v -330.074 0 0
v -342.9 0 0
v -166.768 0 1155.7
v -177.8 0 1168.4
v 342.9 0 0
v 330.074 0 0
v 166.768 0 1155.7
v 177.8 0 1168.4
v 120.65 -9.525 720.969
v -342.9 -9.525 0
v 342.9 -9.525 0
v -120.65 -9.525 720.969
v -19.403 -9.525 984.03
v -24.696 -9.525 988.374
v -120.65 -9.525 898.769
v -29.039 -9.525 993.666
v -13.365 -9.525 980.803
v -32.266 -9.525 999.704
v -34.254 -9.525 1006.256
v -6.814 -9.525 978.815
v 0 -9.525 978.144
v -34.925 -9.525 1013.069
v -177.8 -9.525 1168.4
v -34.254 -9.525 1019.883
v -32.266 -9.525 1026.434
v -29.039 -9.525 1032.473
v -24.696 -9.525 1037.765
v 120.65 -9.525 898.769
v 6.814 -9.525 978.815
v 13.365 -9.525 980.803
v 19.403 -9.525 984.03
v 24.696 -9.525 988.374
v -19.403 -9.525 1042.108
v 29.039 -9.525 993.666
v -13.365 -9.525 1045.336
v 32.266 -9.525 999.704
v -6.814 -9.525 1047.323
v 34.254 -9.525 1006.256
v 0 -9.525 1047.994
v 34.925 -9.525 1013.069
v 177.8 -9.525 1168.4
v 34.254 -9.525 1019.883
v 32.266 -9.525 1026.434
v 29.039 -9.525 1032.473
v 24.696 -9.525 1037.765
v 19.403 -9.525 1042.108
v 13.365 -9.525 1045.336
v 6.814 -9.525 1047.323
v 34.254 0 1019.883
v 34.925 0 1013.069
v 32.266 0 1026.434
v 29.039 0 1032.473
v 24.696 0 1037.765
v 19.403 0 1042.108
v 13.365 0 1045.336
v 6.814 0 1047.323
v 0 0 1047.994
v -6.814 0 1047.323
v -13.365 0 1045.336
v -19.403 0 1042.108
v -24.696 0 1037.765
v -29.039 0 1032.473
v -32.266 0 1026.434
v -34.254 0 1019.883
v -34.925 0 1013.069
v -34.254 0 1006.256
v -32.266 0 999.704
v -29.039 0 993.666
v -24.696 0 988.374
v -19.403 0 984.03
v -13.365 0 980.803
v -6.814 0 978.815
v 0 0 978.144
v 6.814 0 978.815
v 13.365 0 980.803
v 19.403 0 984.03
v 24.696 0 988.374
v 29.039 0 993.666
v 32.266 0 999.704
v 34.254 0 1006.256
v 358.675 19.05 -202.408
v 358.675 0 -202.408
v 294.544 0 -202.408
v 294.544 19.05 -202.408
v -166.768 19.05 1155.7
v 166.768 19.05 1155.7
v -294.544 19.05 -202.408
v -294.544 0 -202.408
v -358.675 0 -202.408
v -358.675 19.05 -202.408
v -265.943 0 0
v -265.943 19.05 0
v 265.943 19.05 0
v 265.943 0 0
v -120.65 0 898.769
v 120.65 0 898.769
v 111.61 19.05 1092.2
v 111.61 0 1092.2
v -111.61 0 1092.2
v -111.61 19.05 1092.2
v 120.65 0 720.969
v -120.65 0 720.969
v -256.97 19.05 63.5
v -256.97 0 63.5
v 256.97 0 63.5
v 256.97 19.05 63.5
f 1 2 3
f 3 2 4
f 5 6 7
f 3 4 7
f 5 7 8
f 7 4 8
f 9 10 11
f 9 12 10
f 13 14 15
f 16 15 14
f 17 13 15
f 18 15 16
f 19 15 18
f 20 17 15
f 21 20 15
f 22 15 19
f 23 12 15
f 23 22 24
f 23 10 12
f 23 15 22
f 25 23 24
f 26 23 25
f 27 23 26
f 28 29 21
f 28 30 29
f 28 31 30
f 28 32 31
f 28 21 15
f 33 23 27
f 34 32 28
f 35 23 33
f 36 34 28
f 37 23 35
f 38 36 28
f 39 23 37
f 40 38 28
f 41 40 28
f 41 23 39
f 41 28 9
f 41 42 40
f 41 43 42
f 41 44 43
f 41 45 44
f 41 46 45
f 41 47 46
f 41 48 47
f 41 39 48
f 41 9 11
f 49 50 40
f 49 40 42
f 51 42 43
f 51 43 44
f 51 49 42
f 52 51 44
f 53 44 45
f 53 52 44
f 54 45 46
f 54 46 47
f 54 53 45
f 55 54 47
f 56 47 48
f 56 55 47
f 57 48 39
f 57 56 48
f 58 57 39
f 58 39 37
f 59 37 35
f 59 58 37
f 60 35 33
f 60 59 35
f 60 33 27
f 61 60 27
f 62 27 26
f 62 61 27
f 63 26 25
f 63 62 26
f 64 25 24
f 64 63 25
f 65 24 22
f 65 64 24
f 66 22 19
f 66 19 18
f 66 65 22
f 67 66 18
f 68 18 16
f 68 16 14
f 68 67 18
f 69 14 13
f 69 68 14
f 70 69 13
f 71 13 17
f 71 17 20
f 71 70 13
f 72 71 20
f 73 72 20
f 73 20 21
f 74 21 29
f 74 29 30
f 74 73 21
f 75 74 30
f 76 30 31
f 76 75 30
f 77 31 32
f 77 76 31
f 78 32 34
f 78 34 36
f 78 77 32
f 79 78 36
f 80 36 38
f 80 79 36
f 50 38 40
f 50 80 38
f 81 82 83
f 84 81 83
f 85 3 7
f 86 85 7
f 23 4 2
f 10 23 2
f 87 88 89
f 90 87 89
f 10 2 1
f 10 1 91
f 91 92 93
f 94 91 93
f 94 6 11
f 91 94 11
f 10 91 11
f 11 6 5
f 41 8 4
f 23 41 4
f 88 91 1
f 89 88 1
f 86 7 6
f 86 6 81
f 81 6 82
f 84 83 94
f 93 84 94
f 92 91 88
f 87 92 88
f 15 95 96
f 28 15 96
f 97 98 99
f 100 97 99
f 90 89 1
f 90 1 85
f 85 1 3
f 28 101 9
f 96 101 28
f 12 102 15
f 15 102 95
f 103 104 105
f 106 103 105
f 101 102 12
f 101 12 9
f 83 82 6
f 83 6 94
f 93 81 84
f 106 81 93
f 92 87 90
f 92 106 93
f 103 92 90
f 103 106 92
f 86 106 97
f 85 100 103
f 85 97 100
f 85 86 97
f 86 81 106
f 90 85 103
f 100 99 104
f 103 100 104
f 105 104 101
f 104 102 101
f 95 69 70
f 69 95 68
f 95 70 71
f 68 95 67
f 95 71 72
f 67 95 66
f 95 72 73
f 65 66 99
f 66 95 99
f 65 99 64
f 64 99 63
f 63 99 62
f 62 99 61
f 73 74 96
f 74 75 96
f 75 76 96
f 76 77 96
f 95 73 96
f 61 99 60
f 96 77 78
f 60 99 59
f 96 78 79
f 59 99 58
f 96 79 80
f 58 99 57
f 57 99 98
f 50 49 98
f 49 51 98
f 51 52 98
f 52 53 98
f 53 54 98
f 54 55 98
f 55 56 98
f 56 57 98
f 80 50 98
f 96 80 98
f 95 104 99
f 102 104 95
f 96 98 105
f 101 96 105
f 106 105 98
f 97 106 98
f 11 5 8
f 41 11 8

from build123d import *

# Parameters (mm, degrees)
F0_W     = 241.3
F0_H     = 177.8
F0_R     = 34.925
F1_DEPTH = 9.525
F3_DEPTH = 19.05


with BuildPart() as f1:
    # F0 (on Front) → F1 (new body)
    with BuildSketch(Plane.XZ):
        Polygon((-177.8, 1168.4), (-342.9, 0), (342.9, 0), (177.8, 1168.4), align=None)
        with Locations((0, 809.869231)):
            Rectangle(F0_W, F0_H, mode=Mode.SUBTRACT)
        with Locations((0, 1013.069231)):
            Circle(F0_R, mode=Mode.SUBTRACT)
    extrude(amount=F1_DEPTH)

    # F2 (on face) → F3 (join)
    with BuildSketch(Plane(origin=(0, 0, 0), x_dir=(-1, 0, 0), z_dir=(0, 1, 0))):
        Polygon((-166.768402, 1155.7), (-358.675023, -202.408394), (-294.544206, -202.408394), (-265.94302, 0), (265.94302, 0), (294.544206, -202.408394), (358.675023, -202.408394), (166.768402, 1155.7), (111.610412, 1092.2), (256.970194, 63.5), (-256.970194, 63.5), (-111.610412, 1092.2), align=None)
        Polygon((166.768402, 1155.7), (-166.768402, 1155.7), (-111.610412, 1092.2), (111.610412, 1092.2), align=None)
    extrude(amount=F3_DEPTH)


solid = f1.part
